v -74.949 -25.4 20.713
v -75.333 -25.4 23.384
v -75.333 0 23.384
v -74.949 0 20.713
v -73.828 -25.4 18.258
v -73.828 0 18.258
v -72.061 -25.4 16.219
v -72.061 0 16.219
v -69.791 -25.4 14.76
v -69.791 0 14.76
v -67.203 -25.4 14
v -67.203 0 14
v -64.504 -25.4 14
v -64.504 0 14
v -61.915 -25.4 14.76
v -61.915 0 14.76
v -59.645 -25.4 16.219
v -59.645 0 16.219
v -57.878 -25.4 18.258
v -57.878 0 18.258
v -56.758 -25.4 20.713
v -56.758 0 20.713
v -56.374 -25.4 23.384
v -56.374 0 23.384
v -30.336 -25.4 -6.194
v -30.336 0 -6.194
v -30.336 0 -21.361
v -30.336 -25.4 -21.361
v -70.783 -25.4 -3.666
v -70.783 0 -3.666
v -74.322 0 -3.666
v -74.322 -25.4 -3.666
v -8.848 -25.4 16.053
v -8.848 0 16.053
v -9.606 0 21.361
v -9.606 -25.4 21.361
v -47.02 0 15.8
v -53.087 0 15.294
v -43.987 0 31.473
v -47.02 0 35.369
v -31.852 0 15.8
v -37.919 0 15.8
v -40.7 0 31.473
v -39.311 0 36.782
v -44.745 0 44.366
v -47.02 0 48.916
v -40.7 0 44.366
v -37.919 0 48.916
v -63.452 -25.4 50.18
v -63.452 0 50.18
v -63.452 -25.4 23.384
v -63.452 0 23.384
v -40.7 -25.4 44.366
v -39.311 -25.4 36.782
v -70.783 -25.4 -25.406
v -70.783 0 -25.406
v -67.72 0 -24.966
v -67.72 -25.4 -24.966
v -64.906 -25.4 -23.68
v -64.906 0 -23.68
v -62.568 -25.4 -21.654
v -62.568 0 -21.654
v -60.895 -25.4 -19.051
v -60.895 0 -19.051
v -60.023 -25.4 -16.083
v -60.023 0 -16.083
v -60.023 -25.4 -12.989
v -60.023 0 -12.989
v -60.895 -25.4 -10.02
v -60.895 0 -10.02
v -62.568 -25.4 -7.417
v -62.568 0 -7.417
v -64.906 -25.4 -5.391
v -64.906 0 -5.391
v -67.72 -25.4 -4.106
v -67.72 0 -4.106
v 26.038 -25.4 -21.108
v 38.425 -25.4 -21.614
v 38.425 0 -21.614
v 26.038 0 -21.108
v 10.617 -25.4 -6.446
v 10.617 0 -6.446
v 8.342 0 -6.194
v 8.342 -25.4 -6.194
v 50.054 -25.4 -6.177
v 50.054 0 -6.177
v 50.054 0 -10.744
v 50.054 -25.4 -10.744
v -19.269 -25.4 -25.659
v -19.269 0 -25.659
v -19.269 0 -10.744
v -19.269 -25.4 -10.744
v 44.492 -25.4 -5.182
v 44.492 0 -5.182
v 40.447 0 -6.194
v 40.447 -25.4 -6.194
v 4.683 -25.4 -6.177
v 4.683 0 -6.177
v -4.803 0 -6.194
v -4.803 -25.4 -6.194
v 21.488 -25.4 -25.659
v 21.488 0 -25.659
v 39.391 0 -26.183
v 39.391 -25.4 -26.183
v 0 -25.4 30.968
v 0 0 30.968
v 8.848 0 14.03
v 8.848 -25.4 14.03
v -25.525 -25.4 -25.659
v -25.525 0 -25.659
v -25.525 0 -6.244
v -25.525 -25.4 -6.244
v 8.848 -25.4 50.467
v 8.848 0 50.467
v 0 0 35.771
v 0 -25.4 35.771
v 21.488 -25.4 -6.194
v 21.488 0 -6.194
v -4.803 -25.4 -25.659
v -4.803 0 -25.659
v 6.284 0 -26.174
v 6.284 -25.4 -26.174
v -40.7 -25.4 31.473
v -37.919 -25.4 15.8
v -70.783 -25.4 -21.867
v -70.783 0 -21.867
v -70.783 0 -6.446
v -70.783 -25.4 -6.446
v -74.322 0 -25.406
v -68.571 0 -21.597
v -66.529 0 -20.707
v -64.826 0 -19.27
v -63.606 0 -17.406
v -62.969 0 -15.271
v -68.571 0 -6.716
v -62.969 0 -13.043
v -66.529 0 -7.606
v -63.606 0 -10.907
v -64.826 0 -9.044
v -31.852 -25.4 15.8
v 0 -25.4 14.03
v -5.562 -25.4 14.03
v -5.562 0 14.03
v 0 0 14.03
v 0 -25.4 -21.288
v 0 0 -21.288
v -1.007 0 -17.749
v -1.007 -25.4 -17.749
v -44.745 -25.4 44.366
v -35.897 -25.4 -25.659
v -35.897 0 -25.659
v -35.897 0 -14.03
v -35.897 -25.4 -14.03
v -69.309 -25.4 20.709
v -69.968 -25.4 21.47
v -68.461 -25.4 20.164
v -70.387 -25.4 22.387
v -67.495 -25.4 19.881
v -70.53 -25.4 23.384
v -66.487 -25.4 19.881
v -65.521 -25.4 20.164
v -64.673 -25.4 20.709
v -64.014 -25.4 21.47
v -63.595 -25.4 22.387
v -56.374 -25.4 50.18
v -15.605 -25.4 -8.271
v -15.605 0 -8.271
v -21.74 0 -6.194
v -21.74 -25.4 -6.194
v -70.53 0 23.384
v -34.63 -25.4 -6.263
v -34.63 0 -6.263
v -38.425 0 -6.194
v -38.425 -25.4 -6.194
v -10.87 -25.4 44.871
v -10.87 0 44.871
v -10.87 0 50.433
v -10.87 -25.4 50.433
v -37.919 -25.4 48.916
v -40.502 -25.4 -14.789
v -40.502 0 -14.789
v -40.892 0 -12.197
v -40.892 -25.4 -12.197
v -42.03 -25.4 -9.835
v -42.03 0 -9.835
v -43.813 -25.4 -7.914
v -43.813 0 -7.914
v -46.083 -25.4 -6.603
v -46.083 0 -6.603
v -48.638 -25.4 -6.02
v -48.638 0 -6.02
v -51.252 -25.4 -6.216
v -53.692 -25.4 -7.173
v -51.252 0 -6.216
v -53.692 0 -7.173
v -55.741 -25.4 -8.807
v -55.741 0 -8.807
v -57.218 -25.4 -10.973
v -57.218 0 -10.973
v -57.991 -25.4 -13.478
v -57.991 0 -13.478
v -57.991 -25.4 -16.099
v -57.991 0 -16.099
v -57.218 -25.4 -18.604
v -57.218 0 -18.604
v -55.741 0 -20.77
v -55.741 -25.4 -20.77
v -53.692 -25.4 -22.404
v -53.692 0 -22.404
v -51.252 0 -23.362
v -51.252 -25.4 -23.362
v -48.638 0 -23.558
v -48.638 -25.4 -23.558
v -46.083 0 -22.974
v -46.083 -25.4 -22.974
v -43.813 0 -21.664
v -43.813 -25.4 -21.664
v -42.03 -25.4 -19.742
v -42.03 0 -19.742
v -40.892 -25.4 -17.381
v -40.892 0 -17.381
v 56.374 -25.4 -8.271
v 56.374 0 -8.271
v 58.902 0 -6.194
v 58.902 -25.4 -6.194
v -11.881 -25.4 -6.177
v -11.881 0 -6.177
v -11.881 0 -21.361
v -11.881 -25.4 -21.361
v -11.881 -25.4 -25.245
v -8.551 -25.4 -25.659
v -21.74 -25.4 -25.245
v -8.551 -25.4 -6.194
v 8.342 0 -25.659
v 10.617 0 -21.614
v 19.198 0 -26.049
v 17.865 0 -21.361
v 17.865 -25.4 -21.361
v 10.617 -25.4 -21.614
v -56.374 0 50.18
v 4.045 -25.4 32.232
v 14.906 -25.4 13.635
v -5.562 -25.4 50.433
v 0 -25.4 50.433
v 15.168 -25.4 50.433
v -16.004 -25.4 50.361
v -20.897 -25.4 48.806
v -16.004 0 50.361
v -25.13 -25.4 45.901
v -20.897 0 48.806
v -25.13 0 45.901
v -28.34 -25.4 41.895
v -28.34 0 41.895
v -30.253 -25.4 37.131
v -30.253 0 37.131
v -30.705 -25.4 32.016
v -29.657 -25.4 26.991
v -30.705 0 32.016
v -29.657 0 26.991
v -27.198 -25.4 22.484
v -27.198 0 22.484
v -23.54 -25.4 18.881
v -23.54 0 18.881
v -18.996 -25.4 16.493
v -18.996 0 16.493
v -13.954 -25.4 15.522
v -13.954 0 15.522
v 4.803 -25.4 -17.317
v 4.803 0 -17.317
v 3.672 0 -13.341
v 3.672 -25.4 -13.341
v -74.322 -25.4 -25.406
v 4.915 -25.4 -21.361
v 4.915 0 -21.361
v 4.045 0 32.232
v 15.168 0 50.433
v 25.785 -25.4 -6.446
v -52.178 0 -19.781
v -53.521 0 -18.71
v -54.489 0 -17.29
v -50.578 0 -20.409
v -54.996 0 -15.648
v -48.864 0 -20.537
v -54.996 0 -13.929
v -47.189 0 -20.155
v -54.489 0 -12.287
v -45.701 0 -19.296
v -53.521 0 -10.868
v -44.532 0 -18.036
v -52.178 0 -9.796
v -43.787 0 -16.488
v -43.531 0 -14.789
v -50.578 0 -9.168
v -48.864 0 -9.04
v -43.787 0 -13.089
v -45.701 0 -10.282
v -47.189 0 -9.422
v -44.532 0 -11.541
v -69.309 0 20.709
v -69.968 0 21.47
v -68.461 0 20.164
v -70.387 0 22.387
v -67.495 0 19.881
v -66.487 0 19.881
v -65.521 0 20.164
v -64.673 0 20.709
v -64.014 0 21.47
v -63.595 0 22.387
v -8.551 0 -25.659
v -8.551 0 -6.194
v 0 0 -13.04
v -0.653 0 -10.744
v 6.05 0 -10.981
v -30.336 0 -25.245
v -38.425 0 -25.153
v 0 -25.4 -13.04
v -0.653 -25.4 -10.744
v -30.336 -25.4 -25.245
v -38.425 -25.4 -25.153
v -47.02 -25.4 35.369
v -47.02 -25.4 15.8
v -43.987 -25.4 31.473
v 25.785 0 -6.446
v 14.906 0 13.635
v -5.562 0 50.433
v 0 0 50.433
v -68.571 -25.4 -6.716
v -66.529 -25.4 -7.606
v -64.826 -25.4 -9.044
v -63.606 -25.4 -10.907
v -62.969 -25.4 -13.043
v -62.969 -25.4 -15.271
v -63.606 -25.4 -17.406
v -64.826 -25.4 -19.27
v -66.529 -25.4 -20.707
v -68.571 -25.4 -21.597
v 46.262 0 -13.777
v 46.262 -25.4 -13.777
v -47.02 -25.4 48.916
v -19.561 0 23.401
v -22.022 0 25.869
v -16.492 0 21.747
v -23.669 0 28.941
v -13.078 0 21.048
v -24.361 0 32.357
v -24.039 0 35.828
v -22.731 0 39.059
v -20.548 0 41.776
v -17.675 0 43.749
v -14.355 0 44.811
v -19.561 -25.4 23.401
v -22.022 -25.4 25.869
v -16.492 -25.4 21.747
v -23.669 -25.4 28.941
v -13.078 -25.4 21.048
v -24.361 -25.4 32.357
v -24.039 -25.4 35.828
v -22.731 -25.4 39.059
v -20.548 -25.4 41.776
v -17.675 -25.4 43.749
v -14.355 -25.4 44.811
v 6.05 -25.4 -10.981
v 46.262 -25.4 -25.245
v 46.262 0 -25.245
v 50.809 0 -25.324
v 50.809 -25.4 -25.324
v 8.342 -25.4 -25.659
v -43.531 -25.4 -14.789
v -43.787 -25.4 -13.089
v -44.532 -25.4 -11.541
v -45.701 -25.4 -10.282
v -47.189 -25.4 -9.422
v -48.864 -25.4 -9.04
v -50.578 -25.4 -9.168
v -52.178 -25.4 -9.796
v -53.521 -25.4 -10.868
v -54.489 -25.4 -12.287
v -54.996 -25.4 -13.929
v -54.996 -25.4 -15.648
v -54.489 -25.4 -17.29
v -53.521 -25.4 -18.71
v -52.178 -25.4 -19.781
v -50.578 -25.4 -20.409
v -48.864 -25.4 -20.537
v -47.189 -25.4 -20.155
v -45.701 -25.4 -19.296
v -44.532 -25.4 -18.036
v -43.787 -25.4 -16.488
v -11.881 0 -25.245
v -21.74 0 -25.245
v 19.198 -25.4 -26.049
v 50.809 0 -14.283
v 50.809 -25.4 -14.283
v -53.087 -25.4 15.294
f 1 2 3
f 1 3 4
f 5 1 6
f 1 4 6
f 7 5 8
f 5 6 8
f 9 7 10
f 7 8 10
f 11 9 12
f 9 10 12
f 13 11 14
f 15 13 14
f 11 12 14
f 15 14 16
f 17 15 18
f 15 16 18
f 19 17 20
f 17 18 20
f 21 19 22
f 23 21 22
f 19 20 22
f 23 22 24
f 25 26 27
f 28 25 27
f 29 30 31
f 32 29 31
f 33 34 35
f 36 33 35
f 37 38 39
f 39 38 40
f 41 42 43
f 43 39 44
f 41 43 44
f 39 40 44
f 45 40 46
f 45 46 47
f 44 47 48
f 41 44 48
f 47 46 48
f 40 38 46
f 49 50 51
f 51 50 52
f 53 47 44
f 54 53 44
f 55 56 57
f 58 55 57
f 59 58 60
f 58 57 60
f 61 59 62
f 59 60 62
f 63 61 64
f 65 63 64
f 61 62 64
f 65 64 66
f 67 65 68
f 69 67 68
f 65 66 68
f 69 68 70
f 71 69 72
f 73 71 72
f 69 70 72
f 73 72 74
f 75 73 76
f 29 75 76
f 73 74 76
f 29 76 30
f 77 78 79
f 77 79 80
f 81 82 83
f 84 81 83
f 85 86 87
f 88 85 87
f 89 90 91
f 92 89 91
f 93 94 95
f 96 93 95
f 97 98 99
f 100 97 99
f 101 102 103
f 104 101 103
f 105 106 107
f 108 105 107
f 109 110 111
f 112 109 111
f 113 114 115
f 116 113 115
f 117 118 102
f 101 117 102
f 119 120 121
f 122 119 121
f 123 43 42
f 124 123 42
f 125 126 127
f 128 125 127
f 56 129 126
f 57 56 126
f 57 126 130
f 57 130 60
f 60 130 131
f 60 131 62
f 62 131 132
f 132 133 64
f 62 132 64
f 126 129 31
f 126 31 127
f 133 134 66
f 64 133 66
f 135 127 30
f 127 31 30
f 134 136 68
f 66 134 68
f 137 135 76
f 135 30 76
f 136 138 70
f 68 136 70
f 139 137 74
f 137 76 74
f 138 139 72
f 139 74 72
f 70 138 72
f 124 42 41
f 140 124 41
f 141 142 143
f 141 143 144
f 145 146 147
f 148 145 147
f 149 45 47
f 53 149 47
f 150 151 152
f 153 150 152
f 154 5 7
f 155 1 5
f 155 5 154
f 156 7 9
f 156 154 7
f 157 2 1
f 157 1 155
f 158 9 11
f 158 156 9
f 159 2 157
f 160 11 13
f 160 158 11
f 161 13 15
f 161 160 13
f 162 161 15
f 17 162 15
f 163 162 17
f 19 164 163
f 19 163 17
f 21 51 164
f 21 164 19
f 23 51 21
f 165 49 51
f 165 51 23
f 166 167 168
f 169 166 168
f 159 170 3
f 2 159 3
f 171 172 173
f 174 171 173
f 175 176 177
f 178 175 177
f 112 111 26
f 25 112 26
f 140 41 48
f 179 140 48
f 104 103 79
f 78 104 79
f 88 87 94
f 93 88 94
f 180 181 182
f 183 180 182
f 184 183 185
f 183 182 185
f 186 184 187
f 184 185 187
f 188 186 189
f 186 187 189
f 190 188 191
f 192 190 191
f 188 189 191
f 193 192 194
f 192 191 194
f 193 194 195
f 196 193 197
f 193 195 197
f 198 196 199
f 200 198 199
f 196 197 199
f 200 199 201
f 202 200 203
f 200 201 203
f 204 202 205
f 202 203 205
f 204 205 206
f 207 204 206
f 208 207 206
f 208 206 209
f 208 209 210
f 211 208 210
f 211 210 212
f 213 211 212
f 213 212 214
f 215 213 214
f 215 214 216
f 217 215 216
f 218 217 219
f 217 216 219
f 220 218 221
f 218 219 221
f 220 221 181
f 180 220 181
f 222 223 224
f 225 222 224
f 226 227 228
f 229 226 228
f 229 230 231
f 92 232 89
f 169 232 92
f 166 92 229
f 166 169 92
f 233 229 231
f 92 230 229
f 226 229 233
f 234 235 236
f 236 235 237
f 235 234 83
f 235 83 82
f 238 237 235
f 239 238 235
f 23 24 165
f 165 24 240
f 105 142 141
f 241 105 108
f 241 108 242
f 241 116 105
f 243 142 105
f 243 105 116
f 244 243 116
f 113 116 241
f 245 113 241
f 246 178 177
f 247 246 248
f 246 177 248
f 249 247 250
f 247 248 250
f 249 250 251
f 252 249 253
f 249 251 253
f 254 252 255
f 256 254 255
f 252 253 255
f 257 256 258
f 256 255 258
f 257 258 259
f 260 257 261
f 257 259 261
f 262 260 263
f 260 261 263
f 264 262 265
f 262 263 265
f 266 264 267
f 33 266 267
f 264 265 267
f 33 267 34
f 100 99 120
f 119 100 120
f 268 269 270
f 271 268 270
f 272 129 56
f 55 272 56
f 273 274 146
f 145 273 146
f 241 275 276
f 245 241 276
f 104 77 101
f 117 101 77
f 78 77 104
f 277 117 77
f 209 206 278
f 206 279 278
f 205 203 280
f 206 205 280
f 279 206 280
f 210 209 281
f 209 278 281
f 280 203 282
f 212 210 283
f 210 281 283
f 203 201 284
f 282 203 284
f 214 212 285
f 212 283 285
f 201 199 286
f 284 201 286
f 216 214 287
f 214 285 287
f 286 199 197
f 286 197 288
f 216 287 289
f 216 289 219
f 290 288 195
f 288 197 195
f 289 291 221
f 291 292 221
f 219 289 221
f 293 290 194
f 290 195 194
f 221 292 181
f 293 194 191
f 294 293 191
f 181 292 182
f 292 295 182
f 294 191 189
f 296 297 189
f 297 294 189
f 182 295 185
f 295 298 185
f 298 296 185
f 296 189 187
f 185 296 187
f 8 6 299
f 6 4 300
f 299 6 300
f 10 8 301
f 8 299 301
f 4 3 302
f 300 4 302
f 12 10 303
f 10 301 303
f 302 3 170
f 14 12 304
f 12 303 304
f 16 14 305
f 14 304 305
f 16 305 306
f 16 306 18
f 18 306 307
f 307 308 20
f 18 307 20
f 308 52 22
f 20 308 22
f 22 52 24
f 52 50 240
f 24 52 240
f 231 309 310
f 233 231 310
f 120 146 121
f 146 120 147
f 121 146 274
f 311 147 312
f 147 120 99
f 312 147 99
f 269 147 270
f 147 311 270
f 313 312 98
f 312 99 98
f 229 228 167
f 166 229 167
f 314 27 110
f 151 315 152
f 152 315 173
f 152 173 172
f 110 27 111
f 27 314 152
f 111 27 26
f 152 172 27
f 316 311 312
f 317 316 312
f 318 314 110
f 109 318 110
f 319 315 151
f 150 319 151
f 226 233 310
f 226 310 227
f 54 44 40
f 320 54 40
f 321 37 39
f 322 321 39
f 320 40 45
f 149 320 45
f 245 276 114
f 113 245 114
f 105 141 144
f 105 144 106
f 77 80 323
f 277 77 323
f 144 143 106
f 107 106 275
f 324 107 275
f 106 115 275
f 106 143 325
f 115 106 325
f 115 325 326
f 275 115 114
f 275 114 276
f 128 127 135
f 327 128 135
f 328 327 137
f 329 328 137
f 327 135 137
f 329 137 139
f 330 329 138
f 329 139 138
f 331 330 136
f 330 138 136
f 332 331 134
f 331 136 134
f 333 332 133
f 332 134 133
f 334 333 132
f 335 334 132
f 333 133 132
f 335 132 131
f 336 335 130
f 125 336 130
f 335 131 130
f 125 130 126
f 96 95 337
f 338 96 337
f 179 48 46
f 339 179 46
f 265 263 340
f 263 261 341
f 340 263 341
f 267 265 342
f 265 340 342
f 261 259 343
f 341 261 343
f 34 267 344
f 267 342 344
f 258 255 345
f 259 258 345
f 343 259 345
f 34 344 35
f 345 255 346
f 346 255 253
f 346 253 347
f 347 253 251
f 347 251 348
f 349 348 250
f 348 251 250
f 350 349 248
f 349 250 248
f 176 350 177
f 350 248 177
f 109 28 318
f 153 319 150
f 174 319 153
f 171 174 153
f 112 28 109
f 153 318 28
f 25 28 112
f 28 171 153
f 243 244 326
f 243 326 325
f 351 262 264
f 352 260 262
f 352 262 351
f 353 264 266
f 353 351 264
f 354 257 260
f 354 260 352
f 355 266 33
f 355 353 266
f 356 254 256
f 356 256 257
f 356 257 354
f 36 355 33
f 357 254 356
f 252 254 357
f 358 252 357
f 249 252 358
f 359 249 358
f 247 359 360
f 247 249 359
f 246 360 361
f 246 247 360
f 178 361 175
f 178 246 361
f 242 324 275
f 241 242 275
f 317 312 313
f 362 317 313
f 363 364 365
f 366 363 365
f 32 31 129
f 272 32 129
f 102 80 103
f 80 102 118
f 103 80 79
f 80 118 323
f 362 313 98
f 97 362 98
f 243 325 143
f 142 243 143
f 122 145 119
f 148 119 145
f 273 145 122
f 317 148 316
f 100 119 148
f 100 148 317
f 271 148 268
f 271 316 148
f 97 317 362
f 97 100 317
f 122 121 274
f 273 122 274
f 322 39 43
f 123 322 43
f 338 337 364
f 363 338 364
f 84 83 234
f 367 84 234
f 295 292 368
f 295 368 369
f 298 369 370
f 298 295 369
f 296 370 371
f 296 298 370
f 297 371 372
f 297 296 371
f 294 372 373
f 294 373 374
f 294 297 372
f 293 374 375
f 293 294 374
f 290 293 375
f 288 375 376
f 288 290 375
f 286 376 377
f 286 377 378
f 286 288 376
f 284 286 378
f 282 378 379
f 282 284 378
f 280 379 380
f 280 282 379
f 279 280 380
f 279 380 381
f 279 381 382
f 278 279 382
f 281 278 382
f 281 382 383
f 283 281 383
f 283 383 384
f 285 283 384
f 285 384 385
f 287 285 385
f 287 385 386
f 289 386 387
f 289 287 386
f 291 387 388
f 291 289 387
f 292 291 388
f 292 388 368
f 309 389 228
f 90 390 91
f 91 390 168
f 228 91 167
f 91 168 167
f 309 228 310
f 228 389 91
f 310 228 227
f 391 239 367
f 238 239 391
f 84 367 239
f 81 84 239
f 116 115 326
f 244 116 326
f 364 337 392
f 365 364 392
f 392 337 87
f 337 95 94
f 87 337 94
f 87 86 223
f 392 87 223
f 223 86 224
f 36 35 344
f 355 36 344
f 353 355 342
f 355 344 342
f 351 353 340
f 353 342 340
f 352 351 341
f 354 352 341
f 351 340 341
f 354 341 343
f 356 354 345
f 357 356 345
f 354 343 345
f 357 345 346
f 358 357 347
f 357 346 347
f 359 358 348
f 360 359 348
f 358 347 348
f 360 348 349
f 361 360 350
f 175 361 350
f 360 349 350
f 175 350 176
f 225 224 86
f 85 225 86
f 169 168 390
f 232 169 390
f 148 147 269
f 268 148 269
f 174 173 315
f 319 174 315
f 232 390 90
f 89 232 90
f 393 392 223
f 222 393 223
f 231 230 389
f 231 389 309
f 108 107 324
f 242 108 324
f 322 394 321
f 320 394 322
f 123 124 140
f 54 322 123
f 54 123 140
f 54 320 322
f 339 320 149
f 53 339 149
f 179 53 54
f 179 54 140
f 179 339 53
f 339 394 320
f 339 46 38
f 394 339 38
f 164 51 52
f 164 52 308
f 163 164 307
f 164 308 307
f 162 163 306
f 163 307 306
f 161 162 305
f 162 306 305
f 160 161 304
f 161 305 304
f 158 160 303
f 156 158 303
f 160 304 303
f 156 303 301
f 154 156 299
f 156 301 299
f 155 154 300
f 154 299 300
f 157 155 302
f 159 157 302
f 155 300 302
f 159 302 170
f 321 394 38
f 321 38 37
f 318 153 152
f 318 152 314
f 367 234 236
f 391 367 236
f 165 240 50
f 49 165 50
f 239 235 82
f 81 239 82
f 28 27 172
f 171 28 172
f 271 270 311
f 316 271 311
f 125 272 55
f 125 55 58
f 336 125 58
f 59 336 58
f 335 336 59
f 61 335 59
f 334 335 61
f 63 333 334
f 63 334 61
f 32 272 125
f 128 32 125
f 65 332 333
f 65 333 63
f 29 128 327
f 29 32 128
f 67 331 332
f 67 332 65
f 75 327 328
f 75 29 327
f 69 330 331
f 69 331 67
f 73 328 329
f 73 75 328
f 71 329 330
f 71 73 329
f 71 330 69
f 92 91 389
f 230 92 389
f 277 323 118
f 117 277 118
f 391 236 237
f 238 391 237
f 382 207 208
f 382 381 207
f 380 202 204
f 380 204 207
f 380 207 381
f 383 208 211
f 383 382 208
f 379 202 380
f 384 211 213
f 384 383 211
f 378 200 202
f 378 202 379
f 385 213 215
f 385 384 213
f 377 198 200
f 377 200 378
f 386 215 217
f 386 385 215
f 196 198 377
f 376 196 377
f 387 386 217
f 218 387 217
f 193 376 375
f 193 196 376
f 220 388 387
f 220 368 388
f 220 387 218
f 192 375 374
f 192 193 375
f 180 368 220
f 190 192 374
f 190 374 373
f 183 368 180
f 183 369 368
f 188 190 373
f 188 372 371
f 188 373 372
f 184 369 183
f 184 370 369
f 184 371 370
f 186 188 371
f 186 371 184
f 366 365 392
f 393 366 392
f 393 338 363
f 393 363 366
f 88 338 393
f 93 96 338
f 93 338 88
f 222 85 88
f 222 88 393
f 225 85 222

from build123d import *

# Parameters (mm, degrees)
F0_R     = 8.793532
F0_R_2   = 5.76464
F1_DEPTH = 25.4


with BuildPart() as f1:
    # F0 (on Front) → F1 (new body)
    with BuildSketch(Plane.XZ):
        with BuildLine():
            Line((-56.373555, 50.180048), (-63.451849, 50.180048))
            Line((-63.451849, 50.180048), (-63.451849, 23.383651))
            ThreePointArc((-63.451849, 23.383651), (-66.990994, 19.844506), (-70.530139, 23.383651))
            Line((-70.530139, 23.383651), (-75.333267, 23.383651))
            ThreePointArc((-75.333267, 23.383651), (-65.853411, 13.903795), (-56.373555, 23.383651))
            Line((-56.373555, 23.383651), (-56.373555, 50.180048))
        make_face()
        Polygon((-47.020096, 48.916064), (-53.087205, 15.294171), (-47.020096, 15.799763), (-43.98654, 31.47313), (-40.70019, 31.47313), (-37.919432, 15.799763), (-31.852324, 15.799763), (-37.919432, 48.916064), align=None)
        Polygon((-47.020096, 35.369455), (-44.744927, 44.365734), (-40.70019, 44.365734), (-39.310776, 36.781849), align=None, mode=Mode.SUBTRACT)
        with BuildLine():
            Line((-10.870238, 44.871327), (-10.870238, 50.432846))
            ThreePointArc((-10.870238, 50.432846), (-30.705189, 32.016459), (-8.847867, 16.052559))
            Line((-8.847867, 16.052559), (-9.606256, 21.361278))
            ThreePointArc((-9.606256, 21.361278), (-24.3608, 32.357025), (-10.870238, 44.871327))
        make_face()
        Polygon((0, 50.432846), (-5.561516, 50.432846), (-5.561516, 14.030189), (0, 14.030189), (0, 30.967535), (8.847867, 14.030189), (14.905685, 13.634984), (4.04474, 32.231517), (15.167773, 50.432846), (8.848056, 50.467367), (0, 35.770666), align=None)
        with BuildLine():
            Line((-70.782937, -3.665545), (-74.322082, -3.665545))
            Line((-74.322082, -3.665545), (-74.322082, -25.40602))
            Line((-74.322082, -25.40602), (-70.782937, -25.40602))
            ThreePointArc((-70.782937, -25.40602), (-59.9127, -14.535782), (-70.782937, -3.665545))
        make_face()
        with BuildLine():
            Line((-70.782937, -21.866873), (-70.782937, -6.446304))
            ThreePointArc((-70.782937, -6.446304), (-62.887922, -14.156588), (-70.782937, -21.866873))
        make_face(mode=Mode.SUBTRACT)
        with Locations((-49.295262, -14.788578)):
            Circle(F0_R)
        with Locations((-49.295262, -14.788578)):
            Circle(F0_R_2, mode=Mode.SUBTRACT)
        Polygon((-38.425025, -6.193507), (-38.425025, -25.153223), (-35.897061, -25.658816), (-35.897061, -14.030189), (-30.335546, -25.245108), (-25.524989, -25.658816), (-25.524989, -6.243984), (-30.335546, -6.193507), (-30.335546, -21.361278), (-34.629716, -6.263318), align=None)
        Polygon((-15.604697, -8.270536), (-21.740474, -6.193507), (-21.740474, -25.245108), (-19.268581, -25.658816), (-19.268581, -10.743839), (-11.881421, -25.245108), (-8.550997, -25.658816), (-8.550997, -6.193507), (-11.881421, -6.177276), (-11.881421, -21.361278), align=None)
        Polygon((4.683362, -6.177276), (-4.803127, -6.193507), (-4.803127, -25.658816), (6.284225, -26.173963), (4.915398, -21.361278), (0, -21.288068), (-1.006604, -17.74893), (4.803127, -17.316541), (3.672298, -13.340636), (0, -13.040018), (-0.65308, -10.743839), (6.049736, -10.981337), align=None)
        Polygon((10.617441, -6.446304), (8.342275, -6.193507), (8.342275, -25.658816), (19.198496, -26.048902), (17.865239, -21.361278), (10.617441, -21.614075), align=None)
        Polygon((25.785215, -6.446304), (21.487677, -6.193507), (21.487677, -25.658816), (39.391241, -26.183136), (38.425025, -21.614075), (26.038008, -21.108484), align=None)
        Polygon((44.492133, -5.182322), (40.447395, -6.193507), (46.261705, -13.777394), (46.261705, -25.245108), (50.809067, -25.324183), (50.809067, -14.282986), (56.373551, -8.270536), (58.901515, -6.193507), (50.053547, -6.177276), (50.053547, -10.743839), align=None)
    extrude(amount=F1_DEPTH)


solid = f1.part
